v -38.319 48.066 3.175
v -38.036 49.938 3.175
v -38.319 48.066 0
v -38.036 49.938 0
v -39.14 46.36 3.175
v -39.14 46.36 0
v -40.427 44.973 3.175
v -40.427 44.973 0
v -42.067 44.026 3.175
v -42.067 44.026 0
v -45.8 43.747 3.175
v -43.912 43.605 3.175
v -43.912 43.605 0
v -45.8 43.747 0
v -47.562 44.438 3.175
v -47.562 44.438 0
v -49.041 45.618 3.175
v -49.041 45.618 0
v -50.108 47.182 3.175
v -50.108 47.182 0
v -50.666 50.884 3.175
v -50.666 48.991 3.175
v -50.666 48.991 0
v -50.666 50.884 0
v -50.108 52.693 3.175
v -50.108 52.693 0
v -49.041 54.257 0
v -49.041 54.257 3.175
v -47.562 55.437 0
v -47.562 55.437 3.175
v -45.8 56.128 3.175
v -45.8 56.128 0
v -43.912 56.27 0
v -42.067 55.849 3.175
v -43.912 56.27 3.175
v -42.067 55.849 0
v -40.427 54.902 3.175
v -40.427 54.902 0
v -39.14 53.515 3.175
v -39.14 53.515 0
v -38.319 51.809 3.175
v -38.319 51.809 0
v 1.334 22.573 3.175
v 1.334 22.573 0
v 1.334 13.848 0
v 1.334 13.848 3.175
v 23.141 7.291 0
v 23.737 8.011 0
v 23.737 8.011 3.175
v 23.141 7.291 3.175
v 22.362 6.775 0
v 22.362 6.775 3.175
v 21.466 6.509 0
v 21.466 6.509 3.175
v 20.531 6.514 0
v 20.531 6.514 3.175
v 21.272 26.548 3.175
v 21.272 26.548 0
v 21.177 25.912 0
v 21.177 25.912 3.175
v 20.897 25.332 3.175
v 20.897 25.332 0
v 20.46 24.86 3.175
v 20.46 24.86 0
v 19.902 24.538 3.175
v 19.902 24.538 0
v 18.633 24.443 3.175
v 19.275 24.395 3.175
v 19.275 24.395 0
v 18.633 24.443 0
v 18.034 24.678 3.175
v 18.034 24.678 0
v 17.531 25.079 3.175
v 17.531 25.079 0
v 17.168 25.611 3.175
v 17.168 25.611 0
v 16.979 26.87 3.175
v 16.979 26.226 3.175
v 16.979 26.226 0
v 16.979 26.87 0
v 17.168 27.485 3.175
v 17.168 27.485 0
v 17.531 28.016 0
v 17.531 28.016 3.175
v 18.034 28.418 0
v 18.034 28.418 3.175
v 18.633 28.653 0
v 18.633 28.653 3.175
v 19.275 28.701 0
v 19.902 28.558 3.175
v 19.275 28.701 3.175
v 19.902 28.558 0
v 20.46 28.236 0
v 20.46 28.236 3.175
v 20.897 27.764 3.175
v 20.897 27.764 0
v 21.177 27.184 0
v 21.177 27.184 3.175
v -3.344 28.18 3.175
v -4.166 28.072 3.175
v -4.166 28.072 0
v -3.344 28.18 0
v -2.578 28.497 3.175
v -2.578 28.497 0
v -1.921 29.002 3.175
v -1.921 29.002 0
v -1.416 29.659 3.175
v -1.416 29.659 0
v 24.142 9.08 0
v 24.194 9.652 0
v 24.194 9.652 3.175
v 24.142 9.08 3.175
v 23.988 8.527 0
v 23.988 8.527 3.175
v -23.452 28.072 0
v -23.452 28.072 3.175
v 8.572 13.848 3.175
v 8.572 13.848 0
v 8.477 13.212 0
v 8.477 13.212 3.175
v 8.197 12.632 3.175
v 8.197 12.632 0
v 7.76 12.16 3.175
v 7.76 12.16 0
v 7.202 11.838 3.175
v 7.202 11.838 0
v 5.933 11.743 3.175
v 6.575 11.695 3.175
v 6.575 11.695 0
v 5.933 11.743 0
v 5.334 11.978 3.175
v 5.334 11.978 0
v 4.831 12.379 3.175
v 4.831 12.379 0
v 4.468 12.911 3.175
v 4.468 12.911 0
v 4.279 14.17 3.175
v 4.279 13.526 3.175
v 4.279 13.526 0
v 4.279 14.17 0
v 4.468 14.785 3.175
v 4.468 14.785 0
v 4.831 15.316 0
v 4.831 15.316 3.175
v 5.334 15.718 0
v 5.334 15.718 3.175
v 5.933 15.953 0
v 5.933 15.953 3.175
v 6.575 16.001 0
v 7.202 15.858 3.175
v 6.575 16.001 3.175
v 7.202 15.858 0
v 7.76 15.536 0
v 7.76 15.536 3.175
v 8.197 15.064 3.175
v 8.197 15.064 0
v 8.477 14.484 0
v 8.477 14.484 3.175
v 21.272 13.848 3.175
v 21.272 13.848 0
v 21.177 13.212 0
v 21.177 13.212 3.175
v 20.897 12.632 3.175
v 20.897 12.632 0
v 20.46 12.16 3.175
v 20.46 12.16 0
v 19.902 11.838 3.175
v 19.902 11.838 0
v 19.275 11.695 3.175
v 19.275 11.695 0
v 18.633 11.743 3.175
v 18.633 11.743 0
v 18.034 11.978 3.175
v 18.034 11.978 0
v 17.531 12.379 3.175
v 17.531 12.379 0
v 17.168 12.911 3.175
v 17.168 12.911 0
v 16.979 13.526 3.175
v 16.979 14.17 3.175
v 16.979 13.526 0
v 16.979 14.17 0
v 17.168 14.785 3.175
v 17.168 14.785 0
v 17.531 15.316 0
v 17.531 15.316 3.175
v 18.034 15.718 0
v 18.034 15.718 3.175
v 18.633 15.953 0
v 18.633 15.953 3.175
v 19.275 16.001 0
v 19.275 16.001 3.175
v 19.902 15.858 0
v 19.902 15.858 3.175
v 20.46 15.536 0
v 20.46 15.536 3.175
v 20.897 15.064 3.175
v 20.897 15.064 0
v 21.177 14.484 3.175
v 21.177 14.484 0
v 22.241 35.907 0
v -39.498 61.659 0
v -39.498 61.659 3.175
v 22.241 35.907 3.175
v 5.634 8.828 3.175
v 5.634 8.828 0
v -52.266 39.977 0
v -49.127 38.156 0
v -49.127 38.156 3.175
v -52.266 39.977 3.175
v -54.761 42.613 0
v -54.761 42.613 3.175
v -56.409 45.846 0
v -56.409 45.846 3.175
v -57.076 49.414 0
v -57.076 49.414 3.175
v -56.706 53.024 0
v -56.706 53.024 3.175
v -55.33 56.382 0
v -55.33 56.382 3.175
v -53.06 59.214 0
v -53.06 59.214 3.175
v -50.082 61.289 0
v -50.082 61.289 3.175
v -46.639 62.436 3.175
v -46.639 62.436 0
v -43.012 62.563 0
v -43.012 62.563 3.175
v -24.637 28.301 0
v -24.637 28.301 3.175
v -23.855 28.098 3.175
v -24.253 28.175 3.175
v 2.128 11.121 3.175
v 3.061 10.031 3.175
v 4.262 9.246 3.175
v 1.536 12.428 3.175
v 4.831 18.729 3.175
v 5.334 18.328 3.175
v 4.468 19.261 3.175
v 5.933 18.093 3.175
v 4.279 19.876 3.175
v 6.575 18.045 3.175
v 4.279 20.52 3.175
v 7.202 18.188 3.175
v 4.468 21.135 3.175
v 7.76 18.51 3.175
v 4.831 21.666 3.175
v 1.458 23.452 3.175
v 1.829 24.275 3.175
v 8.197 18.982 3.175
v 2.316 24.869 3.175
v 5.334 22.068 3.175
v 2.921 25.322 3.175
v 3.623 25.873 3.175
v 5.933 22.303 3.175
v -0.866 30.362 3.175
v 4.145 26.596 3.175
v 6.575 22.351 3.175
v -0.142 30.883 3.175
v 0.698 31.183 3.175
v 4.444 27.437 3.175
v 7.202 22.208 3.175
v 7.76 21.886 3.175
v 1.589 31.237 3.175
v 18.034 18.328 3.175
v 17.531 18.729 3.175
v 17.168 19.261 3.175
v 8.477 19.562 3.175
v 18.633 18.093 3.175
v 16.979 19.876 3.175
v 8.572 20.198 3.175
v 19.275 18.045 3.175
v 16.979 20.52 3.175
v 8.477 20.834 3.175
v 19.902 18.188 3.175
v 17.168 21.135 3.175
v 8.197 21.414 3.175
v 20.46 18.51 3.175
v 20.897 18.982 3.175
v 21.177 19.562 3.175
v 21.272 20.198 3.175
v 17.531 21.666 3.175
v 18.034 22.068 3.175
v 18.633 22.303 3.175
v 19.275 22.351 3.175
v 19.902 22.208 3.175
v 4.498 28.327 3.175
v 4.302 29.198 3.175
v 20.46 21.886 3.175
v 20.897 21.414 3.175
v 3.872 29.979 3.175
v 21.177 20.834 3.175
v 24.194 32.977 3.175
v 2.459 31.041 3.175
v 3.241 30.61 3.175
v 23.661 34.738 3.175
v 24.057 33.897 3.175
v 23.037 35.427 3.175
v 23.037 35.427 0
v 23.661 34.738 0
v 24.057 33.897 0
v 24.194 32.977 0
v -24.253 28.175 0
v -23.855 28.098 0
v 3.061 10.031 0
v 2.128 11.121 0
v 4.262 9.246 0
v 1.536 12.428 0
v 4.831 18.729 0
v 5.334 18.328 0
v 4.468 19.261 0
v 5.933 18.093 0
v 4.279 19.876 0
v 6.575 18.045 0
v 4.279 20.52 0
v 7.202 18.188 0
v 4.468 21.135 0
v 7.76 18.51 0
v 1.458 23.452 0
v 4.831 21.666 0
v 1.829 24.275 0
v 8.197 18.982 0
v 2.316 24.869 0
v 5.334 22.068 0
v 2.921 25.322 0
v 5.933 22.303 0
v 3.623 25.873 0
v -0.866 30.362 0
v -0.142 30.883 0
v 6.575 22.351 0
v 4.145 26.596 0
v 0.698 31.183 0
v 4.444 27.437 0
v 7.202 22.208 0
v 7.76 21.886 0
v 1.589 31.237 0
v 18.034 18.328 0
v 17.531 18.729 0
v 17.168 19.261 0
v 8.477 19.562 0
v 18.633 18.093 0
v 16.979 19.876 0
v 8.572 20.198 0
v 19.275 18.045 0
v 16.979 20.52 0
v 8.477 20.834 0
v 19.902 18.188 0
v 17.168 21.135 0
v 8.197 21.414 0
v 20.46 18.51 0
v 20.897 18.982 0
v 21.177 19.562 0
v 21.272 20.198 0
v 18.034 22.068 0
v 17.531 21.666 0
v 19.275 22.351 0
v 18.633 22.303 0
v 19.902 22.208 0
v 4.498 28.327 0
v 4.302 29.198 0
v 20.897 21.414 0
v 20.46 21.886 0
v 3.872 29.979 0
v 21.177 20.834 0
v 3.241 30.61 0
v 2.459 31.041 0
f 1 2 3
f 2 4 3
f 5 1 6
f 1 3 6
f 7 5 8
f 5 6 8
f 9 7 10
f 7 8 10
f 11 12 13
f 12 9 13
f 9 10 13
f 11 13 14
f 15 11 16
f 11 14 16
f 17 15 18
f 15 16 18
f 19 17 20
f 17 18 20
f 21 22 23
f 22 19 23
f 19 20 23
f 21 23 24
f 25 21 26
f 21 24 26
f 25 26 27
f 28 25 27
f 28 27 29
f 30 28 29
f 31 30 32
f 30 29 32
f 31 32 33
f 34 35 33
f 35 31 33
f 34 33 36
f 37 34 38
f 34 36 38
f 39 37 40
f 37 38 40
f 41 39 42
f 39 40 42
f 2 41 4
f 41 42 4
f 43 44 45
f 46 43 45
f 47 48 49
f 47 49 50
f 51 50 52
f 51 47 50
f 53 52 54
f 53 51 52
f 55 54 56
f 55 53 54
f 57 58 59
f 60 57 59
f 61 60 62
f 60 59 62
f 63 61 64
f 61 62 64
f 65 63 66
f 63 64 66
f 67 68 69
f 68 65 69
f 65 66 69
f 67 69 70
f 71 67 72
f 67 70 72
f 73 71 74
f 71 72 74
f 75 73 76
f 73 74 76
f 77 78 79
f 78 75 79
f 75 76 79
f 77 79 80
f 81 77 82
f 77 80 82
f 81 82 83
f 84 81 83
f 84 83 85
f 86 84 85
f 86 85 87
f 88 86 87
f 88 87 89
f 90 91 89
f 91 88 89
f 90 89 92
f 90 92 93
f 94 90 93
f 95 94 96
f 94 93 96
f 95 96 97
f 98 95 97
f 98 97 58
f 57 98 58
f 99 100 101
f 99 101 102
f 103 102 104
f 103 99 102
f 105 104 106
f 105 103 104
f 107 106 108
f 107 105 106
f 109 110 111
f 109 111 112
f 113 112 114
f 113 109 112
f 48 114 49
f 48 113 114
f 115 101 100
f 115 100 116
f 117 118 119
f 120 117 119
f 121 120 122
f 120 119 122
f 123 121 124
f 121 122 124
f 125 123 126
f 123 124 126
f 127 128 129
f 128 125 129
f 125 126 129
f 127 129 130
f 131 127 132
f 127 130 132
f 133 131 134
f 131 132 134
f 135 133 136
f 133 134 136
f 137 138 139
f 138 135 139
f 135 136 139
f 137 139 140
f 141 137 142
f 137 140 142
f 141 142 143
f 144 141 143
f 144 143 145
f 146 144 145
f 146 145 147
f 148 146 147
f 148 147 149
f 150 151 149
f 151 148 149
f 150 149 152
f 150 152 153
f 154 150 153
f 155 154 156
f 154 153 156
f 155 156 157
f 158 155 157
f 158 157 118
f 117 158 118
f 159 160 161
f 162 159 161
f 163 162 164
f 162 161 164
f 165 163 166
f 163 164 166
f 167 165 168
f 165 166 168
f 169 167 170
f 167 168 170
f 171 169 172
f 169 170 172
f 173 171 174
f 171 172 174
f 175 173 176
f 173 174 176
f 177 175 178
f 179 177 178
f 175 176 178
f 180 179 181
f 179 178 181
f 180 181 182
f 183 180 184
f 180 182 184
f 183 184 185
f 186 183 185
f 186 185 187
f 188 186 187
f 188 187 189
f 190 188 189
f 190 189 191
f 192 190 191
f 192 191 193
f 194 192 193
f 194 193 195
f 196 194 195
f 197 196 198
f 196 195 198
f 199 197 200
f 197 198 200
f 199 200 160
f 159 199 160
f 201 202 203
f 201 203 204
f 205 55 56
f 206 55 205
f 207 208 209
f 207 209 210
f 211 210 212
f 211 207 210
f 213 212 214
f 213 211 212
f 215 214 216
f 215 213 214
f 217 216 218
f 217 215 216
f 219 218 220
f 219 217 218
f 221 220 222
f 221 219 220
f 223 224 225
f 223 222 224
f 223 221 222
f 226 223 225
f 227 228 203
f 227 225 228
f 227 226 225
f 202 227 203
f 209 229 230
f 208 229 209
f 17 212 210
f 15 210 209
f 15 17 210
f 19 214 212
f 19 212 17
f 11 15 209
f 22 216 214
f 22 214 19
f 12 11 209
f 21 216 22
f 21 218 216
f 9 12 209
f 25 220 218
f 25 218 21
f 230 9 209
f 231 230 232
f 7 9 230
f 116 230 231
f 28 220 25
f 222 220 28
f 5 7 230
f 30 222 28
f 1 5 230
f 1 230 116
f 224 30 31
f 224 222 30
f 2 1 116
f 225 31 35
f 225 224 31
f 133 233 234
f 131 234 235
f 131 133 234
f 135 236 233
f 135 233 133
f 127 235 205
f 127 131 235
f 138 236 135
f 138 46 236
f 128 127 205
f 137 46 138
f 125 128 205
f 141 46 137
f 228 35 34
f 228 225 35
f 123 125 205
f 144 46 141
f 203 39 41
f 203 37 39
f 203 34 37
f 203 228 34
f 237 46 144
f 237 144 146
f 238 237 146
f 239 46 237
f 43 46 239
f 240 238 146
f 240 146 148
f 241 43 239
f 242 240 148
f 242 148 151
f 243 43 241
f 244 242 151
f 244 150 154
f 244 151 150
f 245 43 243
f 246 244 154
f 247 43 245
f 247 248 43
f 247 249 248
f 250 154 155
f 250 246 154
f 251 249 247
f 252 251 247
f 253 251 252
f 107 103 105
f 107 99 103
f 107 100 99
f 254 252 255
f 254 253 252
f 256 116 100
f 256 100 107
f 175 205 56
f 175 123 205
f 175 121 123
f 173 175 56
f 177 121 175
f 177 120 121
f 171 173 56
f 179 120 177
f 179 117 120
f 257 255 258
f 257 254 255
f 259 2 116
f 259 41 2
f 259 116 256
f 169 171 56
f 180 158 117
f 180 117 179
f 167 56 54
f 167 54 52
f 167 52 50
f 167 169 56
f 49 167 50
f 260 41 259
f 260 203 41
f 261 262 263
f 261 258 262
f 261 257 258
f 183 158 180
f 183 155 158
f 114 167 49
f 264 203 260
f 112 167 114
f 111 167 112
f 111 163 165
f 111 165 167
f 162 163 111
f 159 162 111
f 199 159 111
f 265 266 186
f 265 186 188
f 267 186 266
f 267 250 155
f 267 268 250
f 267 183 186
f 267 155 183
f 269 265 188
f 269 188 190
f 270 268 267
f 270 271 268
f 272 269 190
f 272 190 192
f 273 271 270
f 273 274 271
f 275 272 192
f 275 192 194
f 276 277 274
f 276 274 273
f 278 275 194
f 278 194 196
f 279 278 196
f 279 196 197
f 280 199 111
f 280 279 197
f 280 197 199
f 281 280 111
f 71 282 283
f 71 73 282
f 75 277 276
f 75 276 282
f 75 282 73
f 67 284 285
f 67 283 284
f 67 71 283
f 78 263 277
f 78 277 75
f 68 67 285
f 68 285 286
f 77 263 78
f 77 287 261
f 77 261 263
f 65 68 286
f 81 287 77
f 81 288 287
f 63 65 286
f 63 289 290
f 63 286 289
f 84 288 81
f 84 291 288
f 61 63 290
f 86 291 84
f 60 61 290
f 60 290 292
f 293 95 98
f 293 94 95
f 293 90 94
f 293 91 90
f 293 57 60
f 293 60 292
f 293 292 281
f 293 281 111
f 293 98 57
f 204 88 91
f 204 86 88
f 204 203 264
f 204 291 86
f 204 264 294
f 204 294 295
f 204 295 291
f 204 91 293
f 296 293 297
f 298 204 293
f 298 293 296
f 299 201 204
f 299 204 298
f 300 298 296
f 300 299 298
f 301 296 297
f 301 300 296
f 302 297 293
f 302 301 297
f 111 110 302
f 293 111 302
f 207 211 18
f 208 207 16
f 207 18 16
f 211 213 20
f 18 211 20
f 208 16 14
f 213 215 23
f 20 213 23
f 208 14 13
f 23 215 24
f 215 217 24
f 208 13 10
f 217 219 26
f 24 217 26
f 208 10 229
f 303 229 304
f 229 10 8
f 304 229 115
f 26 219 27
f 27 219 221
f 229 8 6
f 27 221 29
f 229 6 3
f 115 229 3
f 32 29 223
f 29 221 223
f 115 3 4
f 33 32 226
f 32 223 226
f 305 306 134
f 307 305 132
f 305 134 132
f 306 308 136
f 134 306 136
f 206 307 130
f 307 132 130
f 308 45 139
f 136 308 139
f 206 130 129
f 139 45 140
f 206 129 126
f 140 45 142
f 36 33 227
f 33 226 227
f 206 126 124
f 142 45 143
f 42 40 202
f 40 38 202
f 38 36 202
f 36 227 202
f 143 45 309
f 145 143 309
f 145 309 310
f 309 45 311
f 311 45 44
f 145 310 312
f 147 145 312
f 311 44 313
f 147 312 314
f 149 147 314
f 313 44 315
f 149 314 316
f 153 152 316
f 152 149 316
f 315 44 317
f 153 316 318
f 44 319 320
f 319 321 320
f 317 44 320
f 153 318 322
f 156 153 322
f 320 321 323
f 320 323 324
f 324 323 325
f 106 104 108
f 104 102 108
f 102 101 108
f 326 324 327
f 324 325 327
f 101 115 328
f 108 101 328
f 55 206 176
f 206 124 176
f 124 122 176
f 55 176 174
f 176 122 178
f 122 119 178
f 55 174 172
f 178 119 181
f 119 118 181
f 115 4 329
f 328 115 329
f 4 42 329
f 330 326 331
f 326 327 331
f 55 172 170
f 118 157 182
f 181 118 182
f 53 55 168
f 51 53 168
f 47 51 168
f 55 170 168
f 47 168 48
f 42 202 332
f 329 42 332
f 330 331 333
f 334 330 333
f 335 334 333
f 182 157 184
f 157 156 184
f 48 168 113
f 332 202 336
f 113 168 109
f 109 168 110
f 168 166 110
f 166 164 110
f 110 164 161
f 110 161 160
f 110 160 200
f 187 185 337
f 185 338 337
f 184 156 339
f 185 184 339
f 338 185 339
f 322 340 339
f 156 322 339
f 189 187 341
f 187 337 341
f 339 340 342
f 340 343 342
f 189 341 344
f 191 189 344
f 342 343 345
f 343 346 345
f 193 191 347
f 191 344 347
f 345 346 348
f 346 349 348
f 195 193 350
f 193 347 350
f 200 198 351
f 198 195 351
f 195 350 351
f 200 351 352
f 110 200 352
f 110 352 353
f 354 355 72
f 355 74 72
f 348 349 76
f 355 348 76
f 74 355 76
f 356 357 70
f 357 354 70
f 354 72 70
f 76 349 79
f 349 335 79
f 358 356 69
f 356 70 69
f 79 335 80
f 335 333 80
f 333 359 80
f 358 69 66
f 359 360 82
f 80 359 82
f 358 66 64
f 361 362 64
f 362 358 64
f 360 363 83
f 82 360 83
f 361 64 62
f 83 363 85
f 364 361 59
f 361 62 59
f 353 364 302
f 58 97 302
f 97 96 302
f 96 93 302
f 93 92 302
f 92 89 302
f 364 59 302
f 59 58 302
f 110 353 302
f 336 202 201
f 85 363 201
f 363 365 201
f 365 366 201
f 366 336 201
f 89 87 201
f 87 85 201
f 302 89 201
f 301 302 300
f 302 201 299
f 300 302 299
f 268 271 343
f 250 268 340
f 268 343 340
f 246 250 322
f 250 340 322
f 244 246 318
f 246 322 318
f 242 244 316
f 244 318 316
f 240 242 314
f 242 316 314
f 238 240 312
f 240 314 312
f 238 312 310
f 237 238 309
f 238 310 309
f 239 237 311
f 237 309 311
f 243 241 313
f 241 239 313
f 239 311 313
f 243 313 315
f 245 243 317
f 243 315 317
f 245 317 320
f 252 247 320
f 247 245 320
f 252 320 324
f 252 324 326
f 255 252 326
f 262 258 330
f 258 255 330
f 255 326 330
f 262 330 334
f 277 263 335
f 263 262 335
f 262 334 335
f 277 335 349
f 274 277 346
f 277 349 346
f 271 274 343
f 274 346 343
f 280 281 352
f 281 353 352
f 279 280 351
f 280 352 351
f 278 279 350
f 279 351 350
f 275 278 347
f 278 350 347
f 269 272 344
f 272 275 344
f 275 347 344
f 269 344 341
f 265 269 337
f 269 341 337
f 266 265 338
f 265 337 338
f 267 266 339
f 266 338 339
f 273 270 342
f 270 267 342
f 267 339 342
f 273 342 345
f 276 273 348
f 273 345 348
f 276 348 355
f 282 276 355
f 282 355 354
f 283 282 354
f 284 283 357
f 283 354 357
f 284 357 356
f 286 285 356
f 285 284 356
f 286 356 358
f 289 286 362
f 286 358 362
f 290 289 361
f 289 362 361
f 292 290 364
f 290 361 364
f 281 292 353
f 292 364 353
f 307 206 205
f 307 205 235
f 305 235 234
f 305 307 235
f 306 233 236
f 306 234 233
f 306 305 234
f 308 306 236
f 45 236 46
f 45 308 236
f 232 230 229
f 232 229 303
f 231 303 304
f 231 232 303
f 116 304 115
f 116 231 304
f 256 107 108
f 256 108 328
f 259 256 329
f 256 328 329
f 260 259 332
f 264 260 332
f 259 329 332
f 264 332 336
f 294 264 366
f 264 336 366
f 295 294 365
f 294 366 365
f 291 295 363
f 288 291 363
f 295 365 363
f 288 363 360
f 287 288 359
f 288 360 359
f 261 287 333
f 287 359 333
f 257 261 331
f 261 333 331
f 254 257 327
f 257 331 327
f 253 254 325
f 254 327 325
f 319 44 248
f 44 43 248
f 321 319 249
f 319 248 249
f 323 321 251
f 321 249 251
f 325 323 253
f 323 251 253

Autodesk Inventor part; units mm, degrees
ref_plane "YZ Plane" through (0, 0, 0) normal (1, 0, 0) x (0, 1, 0)
ref_plane "XZ Plane" through (0, 0, 0) normal (0, 1, 0) x (-1, 0, 0)
ref_plane "XY Plane" through (0, 0, 0) normal (0, 0, 1) x (1, 0, 0)
sketch "Sketch1" plane through (0, 0, 0) normal (0, 0, 1) x (1, 0, 0)
  circle A0 centre (19.1135, 26.5479) radius 2.159 projected
  circle A1 centre (6.4135, 13.8479) radius 2.159 projected
  circle A2 centre (6.4135, 20.1979) radius 2.159 projected
  circle A3 centre (19.1135, 13.8479) radius 2.159 projected
  circle A4 centre (19.1135, 20.1979) radius 2.159 projected
  circle A5 centre (-11.4935, -25.7761) radius 2.159 projected
  circle A6 centre (-5.3048, -30.2218) radius 2.159 projected
  circle A7 centre (-17.6822, -21.3304) radius 2.159 projected
  arc A8 (2.921, 26.1944) -> (1.3335, 23.4448) centre (4.5085, 23.4448) ccw projected
  line L0 (1.3335, 23.4448) -> (1.3335, 14.8701) projected
  arc A9 (0.7371, 13.0177) -> (1.3335, 14.8701) centre (-1.8415, 14.8701) ccw projected
  line L1 (0.7371, 13.0177) -> (-21.808, -18.3666) projected
  arc A10 (-21.808, -18.3666) -> (-0.6209, -32.3394) centre (-11.4935, -25.7761) ccw projected
  line L2 (-0.6209, -32.3394) -> (23.7367, 8.0111) projected
  arc A11 (23.7367, 8.0111) -> (24.1935, 9.6519) centre (21.0185, 9.6519) ccw projected
  line L3 (24.1935, 9.6519) -> (24.1935, 32.9769) projected
  arc A12 (24.1935, 32.9769) -> (19.431, 35.7265) centre (21.0185, 32.9769) ccw projected
  line L4 (19.431, 35.7265) -> (2.921, 26.1944) projected
  circle A13 centre (21.0185, 9.6519) radius 3.175
  line L5 (1.3335, 14.8701) -> (1.3335, 13.8479)
  circle A14 centre (6.4135, 13.8479) radius 5.08
  line L6 (20.5313, 6.5145) -> (5.6339, 8.8281)
  circle A15 centre (-44.3865, 49.9375) radius 6.35
  circle A16 centre (-44.3865, 49.9375) radius 25.4 construction
  circle A17 centre (-11.4935, -25.7761) radius 82.55 construction
  circle A18 centre (-11.4935, -25.7761) radius 57.15 construction
  circle A19 centre (1.3335, 28.0719) radius 3.175
  line L7 (-1.8415, 28.0719) -> (-24.0665, 28.0719)
  circle A20 centre (-44.3865, 49.9375) radius 12.7
  line L8 (-24.0665, 28.0719) -> (-49.1272, 38.1555)
  line L9 (-39.4975, 61.6587) -> (22.2408, 35.9072)
  point P0 (0, 0)
  point P1 (1.6958, 24.9176)
  dimension "d10" = 6.35
  dimension "d3" = 12.7
  dimension "d4" = 50.8
  dimension "d5" = 114.3
  dimension "d6" = 45.72
  dimension "d8" = 25.4
  dimension "d12" = 1.524
  dimension "d13" = 25.4
extrude "Extrusion1" add sketch "Sketch1" along normal blind 3.175 contours A2 A14 L5 L0 A8 A19 L4 A12 L3 A13 A3 L6 | A2 A14 | A13 A3 A11 | L7 L8 A20 L9 A12 L4 A19 | A20 picked at (8.0498, 17.4208)
fillet "Fillet1" radius 3.175 3 edges at (1.6958, 24.9176, 1.5875) (-1.8415, 28.0719, 1.5875) (-24.0665, 28.0719, 1.5875)
properties part number "IntakePoly" material "Polycarbonate, Smoke"
